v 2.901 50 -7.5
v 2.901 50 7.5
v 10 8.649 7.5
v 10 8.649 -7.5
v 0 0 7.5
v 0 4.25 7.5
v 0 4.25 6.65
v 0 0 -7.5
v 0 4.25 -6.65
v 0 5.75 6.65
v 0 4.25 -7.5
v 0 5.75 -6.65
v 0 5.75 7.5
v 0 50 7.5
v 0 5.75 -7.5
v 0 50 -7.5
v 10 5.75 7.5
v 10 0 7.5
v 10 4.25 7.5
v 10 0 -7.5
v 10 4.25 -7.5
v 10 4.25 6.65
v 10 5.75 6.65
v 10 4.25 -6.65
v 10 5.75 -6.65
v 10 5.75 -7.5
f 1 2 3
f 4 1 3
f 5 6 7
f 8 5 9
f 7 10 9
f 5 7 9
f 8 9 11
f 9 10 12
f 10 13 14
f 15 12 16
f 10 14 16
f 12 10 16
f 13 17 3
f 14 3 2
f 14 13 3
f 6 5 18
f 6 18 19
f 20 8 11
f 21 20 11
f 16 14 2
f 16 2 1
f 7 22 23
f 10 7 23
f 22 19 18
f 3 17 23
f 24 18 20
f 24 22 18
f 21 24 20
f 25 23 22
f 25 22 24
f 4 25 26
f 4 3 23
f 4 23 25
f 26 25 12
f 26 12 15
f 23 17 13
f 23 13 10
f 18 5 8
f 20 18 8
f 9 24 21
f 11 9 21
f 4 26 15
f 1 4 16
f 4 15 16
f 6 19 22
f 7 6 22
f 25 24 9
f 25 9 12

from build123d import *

# Parameters (mm, degrees)
SKETCH1_W           = 15
SKETCH1_H           = 50
BOSS_EXTRUDE1_DEPTH = 10
SKETCH2_W           = 0.85
SKETCH2_H           = 1.5
CUT_EXTRUDE1_DEPTH  = 52.53882032
CUT_EXTRUDE3_DEPTH  = 54.150729064


with BuildPart() as part:
    # Sketch1 → Boss-Extrude1 (new body)
    with BuildSketch(Plane(origin=(0, 0, 0), x_dir=(0, 0, -1), z_dir=(1, 0, 0))):
        with Locations((0, 25)):
            Rectangle(SKETCH1_W, SKETCH1_H)
    extrude(amount=BOSS_EXTRUDE1_DEPTH)

    # Sketch2 → Cut-Extrude1 (cut, through all)
    with BuildSketch(Plane(origin=(10, 0, 0), x_dir=(0, 0, -1), z_dir=(1, 0, 0))):
        with Locations((-7.075, 5)):
            Rectangle(SKETCH2_W, SKETCH2_H)
        with Locations((7.075, 5)):
            Rectangle(SKETCH2_W, SKETCH2_H)
    extrude(amount=-CUT_EXTRUDE1_DEPTH, mode=Mode.SUBTRACT)

    # Sketch3 → Cut-Extrude3 (cut, through all)
    with BuildSketch(Plane.XY.offset(7.5)):
        Polygon((2.90122494, 50), (10, 8.648873186), (10, 50), align=None)
    extrude(amount=-CUT_EXTRUDE3_DEPTH, mode=Mode.SUBTRACT)


solid = part.part
